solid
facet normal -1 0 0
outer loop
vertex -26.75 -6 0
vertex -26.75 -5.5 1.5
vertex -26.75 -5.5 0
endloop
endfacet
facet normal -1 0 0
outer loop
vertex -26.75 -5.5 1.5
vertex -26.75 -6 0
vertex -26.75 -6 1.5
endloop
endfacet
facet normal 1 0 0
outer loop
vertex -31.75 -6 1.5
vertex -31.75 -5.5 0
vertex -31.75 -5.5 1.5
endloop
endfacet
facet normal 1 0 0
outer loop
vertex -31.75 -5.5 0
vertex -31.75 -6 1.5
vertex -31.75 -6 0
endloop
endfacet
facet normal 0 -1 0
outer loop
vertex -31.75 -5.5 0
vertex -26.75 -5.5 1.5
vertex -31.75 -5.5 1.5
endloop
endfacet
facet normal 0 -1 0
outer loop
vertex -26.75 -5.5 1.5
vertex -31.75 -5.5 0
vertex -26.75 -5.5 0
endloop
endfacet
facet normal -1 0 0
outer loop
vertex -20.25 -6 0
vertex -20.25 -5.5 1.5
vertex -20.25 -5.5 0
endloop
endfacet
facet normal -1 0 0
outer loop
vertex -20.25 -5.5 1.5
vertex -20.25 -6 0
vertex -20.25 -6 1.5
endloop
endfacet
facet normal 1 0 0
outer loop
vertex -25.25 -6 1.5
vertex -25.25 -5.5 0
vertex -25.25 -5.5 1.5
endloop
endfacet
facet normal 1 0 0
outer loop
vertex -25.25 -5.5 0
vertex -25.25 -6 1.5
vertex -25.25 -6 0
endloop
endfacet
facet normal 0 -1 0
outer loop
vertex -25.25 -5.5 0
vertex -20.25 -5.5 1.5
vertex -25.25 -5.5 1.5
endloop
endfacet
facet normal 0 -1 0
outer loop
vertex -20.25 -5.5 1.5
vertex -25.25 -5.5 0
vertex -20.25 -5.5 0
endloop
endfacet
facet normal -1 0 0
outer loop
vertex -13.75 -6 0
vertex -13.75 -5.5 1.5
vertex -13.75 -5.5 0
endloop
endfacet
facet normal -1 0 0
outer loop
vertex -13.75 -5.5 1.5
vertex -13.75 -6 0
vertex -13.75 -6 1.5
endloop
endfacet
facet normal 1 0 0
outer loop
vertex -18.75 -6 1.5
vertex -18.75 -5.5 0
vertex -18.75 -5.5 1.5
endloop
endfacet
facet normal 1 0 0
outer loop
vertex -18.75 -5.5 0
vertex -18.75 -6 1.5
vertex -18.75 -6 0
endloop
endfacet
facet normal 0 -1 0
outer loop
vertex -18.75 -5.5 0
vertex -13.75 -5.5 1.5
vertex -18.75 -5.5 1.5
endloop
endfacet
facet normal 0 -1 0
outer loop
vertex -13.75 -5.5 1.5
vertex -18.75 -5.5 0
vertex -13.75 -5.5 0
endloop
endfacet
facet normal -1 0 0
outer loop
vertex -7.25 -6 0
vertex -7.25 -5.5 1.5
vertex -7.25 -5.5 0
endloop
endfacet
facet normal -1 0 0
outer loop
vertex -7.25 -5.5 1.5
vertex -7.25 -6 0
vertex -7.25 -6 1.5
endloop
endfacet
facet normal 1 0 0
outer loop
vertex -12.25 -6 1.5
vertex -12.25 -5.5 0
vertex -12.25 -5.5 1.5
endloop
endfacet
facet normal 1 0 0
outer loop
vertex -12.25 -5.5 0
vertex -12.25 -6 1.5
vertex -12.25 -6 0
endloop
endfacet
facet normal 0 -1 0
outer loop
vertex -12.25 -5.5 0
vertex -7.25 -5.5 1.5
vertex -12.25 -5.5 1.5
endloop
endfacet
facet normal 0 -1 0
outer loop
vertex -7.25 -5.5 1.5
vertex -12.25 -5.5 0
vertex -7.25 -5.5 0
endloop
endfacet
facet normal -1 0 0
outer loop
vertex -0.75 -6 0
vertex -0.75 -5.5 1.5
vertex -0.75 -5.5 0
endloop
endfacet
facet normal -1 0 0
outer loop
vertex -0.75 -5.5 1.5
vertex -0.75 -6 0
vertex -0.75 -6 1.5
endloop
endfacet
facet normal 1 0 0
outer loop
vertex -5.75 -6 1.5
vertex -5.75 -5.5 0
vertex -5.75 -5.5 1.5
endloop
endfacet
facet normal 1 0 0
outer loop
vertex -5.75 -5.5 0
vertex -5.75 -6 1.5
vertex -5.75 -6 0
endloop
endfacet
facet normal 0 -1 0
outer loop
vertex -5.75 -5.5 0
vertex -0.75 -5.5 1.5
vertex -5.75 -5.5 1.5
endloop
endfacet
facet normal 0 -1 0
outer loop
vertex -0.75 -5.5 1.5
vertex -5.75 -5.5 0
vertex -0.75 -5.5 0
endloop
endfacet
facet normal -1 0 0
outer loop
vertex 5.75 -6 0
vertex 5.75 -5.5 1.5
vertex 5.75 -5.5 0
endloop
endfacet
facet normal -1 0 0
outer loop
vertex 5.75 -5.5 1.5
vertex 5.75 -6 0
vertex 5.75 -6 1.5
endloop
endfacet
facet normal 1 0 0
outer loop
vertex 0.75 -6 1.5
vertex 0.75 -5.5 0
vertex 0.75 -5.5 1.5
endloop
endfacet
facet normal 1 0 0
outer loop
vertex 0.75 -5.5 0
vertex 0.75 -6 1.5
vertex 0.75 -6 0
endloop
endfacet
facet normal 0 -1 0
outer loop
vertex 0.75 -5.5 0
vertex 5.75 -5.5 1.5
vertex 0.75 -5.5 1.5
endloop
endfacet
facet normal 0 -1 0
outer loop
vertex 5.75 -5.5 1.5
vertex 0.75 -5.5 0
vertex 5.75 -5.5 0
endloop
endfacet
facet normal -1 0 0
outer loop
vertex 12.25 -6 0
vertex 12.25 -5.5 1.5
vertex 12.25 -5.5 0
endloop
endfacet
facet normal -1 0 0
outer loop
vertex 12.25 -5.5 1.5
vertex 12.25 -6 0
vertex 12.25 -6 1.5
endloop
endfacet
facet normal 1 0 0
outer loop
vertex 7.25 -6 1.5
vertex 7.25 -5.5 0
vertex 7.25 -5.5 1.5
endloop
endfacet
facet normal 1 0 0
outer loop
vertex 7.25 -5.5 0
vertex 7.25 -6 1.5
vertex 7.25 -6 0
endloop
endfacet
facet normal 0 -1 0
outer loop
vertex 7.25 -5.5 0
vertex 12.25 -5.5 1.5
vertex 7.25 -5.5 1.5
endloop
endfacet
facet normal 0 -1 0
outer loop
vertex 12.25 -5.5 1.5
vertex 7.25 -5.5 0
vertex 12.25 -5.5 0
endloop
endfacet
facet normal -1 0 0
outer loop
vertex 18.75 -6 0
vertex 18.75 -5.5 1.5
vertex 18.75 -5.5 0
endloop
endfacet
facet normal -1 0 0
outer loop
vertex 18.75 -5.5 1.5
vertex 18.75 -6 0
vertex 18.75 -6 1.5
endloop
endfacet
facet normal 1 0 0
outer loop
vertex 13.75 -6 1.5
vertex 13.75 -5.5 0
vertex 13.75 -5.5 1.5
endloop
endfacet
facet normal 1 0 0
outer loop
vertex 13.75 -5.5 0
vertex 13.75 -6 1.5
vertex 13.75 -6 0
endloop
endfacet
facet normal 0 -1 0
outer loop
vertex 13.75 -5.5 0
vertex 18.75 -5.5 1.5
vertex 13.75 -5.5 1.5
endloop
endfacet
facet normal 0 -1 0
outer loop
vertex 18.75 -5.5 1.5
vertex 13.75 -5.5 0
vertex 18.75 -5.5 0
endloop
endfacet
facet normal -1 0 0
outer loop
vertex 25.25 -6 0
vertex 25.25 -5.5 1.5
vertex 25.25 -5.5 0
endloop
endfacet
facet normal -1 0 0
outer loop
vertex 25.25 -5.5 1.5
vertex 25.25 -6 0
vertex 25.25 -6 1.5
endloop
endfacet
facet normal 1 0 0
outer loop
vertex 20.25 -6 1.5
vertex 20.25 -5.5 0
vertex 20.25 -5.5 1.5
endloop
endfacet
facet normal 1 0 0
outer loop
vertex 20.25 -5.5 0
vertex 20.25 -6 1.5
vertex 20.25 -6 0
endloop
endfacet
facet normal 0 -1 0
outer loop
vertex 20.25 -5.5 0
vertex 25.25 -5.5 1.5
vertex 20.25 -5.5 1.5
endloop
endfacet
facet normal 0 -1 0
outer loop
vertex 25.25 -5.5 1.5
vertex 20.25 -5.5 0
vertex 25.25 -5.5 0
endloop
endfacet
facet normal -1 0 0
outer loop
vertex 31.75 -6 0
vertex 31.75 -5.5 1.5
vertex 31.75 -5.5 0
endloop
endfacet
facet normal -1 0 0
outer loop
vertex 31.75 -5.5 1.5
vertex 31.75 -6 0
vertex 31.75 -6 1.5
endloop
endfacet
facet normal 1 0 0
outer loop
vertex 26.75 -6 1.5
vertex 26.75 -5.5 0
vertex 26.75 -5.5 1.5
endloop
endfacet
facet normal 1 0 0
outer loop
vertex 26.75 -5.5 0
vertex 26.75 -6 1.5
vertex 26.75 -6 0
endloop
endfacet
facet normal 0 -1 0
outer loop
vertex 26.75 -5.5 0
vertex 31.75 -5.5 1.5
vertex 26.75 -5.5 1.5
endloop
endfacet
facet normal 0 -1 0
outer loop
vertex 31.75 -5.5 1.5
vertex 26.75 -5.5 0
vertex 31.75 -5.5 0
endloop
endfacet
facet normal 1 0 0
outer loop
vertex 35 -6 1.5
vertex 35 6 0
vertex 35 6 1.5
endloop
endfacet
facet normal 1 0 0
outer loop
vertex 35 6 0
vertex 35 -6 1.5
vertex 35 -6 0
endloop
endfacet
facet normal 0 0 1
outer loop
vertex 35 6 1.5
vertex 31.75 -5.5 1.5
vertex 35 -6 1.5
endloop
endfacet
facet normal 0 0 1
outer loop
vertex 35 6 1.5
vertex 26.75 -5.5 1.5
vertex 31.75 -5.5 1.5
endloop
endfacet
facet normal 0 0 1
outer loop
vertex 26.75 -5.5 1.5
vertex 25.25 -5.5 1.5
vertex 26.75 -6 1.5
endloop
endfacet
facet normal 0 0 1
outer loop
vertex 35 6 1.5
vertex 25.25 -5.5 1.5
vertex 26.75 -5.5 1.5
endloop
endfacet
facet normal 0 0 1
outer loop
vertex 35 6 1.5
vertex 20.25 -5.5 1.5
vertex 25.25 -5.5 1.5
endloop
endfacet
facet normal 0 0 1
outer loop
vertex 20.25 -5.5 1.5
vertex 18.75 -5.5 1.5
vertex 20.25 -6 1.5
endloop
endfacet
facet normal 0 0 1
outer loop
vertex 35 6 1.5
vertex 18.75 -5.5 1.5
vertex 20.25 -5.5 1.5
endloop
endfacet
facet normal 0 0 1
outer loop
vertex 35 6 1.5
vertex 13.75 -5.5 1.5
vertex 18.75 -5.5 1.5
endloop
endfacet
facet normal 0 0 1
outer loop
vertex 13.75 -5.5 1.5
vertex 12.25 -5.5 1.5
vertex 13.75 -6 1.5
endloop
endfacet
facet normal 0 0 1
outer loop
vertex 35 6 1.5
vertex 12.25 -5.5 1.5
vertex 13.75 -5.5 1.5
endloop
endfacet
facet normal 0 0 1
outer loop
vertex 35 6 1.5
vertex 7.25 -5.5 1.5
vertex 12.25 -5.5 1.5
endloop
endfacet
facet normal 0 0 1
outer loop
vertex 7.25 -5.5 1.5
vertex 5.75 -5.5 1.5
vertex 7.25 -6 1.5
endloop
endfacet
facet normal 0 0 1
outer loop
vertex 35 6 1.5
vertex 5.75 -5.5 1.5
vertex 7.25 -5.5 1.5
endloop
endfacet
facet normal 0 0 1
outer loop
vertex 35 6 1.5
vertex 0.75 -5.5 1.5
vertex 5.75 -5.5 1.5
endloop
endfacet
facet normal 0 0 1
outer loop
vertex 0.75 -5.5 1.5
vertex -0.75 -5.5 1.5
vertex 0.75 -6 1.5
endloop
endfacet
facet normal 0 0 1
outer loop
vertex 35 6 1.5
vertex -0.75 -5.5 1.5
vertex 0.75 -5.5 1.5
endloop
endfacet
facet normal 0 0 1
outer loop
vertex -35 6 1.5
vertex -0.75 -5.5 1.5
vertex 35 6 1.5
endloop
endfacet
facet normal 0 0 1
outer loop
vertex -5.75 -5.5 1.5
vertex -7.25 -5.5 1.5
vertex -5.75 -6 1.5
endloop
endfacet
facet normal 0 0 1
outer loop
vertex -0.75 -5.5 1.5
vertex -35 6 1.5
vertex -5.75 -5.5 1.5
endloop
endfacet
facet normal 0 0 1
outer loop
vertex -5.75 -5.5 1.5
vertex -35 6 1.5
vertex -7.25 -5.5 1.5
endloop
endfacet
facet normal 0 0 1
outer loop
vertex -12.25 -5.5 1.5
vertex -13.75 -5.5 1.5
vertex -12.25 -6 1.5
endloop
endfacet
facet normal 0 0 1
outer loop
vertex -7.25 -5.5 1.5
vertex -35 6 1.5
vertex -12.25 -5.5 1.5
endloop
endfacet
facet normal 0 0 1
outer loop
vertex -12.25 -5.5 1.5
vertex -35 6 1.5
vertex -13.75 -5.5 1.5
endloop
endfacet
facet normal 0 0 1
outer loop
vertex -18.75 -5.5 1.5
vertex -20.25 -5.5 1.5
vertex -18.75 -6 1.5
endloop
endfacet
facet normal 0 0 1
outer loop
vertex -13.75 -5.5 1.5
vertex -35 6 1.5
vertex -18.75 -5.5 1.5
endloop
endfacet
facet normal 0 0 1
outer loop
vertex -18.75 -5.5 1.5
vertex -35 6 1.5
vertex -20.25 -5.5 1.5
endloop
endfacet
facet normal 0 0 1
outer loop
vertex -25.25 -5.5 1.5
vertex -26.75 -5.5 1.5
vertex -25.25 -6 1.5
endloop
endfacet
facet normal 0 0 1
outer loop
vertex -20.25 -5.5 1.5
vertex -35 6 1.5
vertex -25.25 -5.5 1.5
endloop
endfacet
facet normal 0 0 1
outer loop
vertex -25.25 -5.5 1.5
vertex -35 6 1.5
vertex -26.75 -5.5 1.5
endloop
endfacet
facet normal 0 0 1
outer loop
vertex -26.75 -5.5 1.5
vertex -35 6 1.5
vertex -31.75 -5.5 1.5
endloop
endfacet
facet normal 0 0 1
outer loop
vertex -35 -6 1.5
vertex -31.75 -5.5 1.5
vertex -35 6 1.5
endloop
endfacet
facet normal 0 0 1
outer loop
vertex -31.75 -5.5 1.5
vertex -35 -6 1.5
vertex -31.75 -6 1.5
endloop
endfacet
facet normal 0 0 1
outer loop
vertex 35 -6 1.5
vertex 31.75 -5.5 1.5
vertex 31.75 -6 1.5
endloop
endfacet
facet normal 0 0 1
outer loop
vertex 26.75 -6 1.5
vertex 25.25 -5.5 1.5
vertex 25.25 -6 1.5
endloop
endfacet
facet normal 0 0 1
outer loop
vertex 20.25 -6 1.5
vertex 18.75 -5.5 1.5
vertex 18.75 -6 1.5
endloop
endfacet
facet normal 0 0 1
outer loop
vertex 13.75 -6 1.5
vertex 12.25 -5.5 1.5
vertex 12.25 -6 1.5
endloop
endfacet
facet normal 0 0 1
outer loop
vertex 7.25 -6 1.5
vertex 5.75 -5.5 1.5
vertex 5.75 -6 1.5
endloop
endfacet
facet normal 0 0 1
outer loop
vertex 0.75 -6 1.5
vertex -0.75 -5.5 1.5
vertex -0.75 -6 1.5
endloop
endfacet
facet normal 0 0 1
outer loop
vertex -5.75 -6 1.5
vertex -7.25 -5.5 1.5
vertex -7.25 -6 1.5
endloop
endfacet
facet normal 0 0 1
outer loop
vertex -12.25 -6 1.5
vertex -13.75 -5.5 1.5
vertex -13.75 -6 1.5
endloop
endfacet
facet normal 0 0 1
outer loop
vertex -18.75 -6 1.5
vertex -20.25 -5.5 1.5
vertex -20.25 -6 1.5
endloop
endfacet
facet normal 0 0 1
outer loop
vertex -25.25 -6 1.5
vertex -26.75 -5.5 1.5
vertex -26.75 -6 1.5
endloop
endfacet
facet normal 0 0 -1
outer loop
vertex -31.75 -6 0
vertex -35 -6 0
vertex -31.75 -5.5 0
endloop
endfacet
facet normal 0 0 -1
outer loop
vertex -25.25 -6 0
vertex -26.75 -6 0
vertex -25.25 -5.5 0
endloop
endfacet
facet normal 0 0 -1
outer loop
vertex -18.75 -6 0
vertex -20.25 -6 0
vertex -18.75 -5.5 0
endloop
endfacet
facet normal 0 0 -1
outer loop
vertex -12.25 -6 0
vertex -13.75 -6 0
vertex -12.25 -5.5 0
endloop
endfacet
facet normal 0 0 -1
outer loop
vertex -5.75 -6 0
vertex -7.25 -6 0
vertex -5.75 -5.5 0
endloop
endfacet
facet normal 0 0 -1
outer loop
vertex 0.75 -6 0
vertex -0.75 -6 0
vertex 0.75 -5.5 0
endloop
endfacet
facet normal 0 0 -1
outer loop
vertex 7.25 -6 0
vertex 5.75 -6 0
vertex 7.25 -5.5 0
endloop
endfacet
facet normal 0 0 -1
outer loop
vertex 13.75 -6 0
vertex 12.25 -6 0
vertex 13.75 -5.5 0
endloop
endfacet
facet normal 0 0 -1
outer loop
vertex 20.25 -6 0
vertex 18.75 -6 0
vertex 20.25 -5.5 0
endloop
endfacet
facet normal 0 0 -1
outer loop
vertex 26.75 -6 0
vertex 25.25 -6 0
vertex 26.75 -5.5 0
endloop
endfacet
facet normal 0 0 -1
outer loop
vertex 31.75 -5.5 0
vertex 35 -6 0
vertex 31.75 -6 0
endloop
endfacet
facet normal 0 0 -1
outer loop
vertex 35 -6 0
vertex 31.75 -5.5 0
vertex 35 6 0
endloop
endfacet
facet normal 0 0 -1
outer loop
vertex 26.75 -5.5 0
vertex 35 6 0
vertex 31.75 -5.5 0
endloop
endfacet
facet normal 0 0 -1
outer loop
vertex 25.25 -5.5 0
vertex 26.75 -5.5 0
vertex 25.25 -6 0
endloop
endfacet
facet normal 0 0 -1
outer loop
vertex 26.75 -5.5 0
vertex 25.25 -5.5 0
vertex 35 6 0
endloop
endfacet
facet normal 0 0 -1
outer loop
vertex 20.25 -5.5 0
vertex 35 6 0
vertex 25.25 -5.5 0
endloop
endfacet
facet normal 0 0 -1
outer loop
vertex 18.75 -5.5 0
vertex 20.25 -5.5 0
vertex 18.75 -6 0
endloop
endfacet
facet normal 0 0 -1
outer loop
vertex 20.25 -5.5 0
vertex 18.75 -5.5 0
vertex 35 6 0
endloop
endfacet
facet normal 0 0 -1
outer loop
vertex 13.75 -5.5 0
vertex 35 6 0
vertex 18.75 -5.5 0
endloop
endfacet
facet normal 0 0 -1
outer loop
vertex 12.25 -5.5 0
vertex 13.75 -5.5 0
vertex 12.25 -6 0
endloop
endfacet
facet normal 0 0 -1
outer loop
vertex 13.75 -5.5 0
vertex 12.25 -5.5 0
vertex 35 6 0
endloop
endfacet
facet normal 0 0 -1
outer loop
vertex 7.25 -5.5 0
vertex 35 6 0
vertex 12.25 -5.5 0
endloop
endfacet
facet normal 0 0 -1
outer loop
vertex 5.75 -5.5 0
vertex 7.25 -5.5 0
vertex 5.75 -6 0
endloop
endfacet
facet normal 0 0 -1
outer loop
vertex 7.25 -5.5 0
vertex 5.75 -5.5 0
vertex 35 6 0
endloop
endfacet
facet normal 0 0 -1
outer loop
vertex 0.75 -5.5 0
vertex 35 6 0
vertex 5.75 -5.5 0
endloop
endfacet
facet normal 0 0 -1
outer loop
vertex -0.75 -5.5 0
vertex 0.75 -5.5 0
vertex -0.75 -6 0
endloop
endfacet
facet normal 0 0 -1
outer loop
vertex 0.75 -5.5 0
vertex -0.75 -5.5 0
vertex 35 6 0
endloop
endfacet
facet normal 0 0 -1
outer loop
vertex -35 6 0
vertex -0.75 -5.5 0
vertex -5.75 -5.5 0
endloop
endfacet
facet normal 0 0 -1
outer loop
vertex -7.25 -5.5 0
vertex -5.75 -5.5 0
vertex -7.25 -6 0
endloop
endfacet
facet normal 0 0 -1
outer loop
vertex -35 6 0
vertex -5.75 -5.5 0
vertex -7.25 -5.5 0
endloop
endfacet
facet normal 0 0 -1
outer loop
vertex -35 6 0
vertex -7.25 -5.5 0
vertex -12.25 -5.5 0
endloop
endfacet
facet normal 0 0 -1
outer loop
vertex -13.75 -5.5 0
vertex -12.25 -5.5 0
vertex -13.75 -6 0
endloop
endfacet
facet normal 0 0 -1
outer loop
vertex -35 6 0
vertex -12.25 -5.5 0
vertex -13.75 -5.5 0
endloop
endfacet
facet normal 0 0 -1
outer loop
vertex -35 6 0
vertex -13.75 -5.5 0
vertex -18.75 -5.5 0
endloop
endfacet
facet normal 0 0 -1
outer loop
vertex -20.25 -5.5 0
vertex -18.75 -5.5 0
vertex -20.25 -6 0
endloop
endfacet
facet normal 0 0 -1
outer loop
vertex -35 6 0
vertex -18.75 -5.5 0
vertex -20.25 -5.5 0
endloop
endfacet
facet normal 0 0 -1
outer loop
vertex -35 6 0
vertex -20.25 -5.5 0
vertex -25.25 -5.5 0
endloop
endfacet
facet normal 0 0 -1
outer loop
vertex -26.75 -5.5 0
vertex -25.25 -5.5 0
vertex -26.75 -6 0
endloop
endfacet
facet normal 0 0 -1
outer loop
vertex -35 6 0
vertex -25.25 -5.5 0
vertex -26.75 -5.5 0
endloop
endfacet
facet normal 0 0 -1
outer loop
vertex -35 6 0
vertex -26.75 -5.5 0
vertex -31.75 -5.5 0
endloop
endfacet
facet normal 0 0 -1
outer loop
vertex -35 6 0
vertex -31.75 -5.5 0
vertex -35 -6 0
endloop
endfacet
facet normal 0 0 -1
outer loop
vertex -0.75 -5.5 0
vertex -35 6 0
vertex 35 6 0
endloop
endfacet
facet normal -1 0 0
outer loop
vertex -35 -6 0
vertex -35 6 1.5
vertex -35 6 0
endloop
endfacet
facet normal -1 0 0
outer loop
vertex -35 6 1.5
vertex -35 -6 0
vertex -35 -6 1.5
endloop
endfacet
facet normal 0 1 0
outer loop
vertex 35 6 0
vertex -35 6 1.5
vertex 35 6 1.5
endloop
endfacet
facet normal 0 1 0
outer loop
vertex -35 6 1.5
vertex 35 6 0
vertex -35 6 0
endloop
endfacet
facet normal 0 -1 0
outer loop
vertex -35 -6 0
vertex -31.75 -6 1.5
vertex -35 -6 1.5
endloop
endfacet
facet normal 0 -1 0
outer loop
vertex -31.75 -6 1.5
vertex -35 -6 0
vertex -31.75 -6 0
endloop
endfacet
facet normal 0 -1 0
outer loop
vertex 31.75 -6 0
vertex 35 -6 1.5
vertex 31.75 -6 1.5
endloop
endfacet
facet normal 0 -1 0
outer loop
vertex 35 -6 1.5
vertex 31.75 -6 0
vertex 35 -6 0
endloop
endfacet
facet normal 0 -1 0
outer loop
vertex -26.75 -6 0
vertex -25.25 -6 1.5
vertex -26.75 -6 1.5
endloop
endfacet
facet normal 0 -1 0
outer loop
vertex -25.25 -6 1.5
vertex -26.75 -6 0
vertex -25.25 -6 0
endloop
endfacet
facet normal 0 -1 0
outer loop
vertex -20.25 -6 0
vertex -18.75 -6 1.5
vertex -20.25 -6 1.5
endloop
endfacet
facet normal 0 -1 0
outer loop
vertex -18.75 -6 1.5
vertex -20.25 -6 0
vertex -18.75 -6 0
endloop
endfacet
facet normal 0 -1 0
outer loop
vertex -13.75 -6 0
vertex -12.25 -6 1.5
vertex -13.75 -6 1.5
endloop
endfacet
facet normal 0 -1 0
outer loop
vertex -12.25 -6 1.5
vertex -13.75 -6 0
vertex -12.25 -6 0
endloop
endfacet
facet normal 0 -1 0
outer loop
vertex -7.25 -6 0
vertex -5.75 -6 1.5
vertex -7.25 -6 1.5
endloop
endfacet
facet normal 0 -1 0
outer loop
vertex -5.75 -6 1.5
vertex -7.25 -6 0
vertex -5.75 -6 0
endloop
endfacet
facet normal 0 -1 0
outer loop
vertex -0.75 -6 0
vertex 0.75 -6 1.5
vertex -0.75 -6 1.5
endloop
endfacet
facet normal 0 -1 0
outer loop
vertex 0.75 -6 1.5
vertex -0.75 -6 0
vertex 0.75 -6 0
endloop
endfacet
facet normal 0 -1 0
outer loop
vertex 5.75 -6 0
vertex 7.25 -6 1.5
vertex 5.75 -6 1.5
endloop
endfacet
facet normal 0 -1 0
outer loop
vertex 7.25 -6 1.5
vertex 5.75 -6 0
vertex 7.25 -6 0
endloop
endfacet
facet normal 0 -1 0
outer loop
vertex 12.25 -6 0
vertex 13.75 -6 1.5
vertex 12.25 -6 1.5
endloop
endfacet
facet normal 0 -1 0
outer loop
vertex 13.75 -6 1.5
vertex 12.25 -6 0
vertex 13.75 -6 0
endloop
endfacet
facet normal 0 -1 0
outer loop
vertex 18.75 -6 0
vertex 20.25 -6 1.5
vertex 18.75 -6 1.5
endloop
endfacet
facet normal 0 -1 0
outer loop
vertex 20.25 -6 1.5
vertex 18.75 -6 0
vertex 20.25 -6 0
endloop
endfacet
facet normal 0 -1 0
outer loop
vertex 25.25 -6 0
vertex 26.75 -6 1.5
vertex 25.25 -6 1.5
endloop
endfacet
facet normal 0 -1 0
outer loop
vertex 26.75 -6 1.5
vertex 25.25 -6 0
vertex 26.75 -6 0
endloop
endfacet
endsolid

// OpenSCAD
// Agarose gel comb - 10 well plate caster
// Print orientation: flat on bed, teeth pointing down (-Y)

// ---- Spine ----
spine_len   = 70;    // spine length along X
spine_wid   = 12;    // spine width along Y
plate_thk   = 1.5;   // plate thickness along Z

// ---- Teeth ----
tooth_count = 10;    // number of wells
tooth_w     = 5.0;   // tooth width along X
tooth_l     = 12;    // tooth length along Y
pitch       = 1.5;   // centre-to-centre spacing along X

// ---- Misc ----
eps         = 0.5;   // cutter overshoot past faces
$fn         = 64;

// Derived
row_span = (tooth_count - 1) * pitch;   // span of gaps
x0       = -(tooth_count * tooth_w + row_span) / 2;  // first tooth X

difference() {
    // Plate with spine
    translate([-spine_len / 2, -spine_wid / 2, 0])
        cube([spine_len, spine_wid, plate_thk]);

    // Teeth cut from -Y side
    for (i = [0 : tooth_count - 1])
        translate([x0 + i * (tooth_w + pitch), -spine_wid / 2 - tooth_l, -eps])
            cube([tooth_w, tooth_l + eps, plate_thk + 2 * eps]);
}
